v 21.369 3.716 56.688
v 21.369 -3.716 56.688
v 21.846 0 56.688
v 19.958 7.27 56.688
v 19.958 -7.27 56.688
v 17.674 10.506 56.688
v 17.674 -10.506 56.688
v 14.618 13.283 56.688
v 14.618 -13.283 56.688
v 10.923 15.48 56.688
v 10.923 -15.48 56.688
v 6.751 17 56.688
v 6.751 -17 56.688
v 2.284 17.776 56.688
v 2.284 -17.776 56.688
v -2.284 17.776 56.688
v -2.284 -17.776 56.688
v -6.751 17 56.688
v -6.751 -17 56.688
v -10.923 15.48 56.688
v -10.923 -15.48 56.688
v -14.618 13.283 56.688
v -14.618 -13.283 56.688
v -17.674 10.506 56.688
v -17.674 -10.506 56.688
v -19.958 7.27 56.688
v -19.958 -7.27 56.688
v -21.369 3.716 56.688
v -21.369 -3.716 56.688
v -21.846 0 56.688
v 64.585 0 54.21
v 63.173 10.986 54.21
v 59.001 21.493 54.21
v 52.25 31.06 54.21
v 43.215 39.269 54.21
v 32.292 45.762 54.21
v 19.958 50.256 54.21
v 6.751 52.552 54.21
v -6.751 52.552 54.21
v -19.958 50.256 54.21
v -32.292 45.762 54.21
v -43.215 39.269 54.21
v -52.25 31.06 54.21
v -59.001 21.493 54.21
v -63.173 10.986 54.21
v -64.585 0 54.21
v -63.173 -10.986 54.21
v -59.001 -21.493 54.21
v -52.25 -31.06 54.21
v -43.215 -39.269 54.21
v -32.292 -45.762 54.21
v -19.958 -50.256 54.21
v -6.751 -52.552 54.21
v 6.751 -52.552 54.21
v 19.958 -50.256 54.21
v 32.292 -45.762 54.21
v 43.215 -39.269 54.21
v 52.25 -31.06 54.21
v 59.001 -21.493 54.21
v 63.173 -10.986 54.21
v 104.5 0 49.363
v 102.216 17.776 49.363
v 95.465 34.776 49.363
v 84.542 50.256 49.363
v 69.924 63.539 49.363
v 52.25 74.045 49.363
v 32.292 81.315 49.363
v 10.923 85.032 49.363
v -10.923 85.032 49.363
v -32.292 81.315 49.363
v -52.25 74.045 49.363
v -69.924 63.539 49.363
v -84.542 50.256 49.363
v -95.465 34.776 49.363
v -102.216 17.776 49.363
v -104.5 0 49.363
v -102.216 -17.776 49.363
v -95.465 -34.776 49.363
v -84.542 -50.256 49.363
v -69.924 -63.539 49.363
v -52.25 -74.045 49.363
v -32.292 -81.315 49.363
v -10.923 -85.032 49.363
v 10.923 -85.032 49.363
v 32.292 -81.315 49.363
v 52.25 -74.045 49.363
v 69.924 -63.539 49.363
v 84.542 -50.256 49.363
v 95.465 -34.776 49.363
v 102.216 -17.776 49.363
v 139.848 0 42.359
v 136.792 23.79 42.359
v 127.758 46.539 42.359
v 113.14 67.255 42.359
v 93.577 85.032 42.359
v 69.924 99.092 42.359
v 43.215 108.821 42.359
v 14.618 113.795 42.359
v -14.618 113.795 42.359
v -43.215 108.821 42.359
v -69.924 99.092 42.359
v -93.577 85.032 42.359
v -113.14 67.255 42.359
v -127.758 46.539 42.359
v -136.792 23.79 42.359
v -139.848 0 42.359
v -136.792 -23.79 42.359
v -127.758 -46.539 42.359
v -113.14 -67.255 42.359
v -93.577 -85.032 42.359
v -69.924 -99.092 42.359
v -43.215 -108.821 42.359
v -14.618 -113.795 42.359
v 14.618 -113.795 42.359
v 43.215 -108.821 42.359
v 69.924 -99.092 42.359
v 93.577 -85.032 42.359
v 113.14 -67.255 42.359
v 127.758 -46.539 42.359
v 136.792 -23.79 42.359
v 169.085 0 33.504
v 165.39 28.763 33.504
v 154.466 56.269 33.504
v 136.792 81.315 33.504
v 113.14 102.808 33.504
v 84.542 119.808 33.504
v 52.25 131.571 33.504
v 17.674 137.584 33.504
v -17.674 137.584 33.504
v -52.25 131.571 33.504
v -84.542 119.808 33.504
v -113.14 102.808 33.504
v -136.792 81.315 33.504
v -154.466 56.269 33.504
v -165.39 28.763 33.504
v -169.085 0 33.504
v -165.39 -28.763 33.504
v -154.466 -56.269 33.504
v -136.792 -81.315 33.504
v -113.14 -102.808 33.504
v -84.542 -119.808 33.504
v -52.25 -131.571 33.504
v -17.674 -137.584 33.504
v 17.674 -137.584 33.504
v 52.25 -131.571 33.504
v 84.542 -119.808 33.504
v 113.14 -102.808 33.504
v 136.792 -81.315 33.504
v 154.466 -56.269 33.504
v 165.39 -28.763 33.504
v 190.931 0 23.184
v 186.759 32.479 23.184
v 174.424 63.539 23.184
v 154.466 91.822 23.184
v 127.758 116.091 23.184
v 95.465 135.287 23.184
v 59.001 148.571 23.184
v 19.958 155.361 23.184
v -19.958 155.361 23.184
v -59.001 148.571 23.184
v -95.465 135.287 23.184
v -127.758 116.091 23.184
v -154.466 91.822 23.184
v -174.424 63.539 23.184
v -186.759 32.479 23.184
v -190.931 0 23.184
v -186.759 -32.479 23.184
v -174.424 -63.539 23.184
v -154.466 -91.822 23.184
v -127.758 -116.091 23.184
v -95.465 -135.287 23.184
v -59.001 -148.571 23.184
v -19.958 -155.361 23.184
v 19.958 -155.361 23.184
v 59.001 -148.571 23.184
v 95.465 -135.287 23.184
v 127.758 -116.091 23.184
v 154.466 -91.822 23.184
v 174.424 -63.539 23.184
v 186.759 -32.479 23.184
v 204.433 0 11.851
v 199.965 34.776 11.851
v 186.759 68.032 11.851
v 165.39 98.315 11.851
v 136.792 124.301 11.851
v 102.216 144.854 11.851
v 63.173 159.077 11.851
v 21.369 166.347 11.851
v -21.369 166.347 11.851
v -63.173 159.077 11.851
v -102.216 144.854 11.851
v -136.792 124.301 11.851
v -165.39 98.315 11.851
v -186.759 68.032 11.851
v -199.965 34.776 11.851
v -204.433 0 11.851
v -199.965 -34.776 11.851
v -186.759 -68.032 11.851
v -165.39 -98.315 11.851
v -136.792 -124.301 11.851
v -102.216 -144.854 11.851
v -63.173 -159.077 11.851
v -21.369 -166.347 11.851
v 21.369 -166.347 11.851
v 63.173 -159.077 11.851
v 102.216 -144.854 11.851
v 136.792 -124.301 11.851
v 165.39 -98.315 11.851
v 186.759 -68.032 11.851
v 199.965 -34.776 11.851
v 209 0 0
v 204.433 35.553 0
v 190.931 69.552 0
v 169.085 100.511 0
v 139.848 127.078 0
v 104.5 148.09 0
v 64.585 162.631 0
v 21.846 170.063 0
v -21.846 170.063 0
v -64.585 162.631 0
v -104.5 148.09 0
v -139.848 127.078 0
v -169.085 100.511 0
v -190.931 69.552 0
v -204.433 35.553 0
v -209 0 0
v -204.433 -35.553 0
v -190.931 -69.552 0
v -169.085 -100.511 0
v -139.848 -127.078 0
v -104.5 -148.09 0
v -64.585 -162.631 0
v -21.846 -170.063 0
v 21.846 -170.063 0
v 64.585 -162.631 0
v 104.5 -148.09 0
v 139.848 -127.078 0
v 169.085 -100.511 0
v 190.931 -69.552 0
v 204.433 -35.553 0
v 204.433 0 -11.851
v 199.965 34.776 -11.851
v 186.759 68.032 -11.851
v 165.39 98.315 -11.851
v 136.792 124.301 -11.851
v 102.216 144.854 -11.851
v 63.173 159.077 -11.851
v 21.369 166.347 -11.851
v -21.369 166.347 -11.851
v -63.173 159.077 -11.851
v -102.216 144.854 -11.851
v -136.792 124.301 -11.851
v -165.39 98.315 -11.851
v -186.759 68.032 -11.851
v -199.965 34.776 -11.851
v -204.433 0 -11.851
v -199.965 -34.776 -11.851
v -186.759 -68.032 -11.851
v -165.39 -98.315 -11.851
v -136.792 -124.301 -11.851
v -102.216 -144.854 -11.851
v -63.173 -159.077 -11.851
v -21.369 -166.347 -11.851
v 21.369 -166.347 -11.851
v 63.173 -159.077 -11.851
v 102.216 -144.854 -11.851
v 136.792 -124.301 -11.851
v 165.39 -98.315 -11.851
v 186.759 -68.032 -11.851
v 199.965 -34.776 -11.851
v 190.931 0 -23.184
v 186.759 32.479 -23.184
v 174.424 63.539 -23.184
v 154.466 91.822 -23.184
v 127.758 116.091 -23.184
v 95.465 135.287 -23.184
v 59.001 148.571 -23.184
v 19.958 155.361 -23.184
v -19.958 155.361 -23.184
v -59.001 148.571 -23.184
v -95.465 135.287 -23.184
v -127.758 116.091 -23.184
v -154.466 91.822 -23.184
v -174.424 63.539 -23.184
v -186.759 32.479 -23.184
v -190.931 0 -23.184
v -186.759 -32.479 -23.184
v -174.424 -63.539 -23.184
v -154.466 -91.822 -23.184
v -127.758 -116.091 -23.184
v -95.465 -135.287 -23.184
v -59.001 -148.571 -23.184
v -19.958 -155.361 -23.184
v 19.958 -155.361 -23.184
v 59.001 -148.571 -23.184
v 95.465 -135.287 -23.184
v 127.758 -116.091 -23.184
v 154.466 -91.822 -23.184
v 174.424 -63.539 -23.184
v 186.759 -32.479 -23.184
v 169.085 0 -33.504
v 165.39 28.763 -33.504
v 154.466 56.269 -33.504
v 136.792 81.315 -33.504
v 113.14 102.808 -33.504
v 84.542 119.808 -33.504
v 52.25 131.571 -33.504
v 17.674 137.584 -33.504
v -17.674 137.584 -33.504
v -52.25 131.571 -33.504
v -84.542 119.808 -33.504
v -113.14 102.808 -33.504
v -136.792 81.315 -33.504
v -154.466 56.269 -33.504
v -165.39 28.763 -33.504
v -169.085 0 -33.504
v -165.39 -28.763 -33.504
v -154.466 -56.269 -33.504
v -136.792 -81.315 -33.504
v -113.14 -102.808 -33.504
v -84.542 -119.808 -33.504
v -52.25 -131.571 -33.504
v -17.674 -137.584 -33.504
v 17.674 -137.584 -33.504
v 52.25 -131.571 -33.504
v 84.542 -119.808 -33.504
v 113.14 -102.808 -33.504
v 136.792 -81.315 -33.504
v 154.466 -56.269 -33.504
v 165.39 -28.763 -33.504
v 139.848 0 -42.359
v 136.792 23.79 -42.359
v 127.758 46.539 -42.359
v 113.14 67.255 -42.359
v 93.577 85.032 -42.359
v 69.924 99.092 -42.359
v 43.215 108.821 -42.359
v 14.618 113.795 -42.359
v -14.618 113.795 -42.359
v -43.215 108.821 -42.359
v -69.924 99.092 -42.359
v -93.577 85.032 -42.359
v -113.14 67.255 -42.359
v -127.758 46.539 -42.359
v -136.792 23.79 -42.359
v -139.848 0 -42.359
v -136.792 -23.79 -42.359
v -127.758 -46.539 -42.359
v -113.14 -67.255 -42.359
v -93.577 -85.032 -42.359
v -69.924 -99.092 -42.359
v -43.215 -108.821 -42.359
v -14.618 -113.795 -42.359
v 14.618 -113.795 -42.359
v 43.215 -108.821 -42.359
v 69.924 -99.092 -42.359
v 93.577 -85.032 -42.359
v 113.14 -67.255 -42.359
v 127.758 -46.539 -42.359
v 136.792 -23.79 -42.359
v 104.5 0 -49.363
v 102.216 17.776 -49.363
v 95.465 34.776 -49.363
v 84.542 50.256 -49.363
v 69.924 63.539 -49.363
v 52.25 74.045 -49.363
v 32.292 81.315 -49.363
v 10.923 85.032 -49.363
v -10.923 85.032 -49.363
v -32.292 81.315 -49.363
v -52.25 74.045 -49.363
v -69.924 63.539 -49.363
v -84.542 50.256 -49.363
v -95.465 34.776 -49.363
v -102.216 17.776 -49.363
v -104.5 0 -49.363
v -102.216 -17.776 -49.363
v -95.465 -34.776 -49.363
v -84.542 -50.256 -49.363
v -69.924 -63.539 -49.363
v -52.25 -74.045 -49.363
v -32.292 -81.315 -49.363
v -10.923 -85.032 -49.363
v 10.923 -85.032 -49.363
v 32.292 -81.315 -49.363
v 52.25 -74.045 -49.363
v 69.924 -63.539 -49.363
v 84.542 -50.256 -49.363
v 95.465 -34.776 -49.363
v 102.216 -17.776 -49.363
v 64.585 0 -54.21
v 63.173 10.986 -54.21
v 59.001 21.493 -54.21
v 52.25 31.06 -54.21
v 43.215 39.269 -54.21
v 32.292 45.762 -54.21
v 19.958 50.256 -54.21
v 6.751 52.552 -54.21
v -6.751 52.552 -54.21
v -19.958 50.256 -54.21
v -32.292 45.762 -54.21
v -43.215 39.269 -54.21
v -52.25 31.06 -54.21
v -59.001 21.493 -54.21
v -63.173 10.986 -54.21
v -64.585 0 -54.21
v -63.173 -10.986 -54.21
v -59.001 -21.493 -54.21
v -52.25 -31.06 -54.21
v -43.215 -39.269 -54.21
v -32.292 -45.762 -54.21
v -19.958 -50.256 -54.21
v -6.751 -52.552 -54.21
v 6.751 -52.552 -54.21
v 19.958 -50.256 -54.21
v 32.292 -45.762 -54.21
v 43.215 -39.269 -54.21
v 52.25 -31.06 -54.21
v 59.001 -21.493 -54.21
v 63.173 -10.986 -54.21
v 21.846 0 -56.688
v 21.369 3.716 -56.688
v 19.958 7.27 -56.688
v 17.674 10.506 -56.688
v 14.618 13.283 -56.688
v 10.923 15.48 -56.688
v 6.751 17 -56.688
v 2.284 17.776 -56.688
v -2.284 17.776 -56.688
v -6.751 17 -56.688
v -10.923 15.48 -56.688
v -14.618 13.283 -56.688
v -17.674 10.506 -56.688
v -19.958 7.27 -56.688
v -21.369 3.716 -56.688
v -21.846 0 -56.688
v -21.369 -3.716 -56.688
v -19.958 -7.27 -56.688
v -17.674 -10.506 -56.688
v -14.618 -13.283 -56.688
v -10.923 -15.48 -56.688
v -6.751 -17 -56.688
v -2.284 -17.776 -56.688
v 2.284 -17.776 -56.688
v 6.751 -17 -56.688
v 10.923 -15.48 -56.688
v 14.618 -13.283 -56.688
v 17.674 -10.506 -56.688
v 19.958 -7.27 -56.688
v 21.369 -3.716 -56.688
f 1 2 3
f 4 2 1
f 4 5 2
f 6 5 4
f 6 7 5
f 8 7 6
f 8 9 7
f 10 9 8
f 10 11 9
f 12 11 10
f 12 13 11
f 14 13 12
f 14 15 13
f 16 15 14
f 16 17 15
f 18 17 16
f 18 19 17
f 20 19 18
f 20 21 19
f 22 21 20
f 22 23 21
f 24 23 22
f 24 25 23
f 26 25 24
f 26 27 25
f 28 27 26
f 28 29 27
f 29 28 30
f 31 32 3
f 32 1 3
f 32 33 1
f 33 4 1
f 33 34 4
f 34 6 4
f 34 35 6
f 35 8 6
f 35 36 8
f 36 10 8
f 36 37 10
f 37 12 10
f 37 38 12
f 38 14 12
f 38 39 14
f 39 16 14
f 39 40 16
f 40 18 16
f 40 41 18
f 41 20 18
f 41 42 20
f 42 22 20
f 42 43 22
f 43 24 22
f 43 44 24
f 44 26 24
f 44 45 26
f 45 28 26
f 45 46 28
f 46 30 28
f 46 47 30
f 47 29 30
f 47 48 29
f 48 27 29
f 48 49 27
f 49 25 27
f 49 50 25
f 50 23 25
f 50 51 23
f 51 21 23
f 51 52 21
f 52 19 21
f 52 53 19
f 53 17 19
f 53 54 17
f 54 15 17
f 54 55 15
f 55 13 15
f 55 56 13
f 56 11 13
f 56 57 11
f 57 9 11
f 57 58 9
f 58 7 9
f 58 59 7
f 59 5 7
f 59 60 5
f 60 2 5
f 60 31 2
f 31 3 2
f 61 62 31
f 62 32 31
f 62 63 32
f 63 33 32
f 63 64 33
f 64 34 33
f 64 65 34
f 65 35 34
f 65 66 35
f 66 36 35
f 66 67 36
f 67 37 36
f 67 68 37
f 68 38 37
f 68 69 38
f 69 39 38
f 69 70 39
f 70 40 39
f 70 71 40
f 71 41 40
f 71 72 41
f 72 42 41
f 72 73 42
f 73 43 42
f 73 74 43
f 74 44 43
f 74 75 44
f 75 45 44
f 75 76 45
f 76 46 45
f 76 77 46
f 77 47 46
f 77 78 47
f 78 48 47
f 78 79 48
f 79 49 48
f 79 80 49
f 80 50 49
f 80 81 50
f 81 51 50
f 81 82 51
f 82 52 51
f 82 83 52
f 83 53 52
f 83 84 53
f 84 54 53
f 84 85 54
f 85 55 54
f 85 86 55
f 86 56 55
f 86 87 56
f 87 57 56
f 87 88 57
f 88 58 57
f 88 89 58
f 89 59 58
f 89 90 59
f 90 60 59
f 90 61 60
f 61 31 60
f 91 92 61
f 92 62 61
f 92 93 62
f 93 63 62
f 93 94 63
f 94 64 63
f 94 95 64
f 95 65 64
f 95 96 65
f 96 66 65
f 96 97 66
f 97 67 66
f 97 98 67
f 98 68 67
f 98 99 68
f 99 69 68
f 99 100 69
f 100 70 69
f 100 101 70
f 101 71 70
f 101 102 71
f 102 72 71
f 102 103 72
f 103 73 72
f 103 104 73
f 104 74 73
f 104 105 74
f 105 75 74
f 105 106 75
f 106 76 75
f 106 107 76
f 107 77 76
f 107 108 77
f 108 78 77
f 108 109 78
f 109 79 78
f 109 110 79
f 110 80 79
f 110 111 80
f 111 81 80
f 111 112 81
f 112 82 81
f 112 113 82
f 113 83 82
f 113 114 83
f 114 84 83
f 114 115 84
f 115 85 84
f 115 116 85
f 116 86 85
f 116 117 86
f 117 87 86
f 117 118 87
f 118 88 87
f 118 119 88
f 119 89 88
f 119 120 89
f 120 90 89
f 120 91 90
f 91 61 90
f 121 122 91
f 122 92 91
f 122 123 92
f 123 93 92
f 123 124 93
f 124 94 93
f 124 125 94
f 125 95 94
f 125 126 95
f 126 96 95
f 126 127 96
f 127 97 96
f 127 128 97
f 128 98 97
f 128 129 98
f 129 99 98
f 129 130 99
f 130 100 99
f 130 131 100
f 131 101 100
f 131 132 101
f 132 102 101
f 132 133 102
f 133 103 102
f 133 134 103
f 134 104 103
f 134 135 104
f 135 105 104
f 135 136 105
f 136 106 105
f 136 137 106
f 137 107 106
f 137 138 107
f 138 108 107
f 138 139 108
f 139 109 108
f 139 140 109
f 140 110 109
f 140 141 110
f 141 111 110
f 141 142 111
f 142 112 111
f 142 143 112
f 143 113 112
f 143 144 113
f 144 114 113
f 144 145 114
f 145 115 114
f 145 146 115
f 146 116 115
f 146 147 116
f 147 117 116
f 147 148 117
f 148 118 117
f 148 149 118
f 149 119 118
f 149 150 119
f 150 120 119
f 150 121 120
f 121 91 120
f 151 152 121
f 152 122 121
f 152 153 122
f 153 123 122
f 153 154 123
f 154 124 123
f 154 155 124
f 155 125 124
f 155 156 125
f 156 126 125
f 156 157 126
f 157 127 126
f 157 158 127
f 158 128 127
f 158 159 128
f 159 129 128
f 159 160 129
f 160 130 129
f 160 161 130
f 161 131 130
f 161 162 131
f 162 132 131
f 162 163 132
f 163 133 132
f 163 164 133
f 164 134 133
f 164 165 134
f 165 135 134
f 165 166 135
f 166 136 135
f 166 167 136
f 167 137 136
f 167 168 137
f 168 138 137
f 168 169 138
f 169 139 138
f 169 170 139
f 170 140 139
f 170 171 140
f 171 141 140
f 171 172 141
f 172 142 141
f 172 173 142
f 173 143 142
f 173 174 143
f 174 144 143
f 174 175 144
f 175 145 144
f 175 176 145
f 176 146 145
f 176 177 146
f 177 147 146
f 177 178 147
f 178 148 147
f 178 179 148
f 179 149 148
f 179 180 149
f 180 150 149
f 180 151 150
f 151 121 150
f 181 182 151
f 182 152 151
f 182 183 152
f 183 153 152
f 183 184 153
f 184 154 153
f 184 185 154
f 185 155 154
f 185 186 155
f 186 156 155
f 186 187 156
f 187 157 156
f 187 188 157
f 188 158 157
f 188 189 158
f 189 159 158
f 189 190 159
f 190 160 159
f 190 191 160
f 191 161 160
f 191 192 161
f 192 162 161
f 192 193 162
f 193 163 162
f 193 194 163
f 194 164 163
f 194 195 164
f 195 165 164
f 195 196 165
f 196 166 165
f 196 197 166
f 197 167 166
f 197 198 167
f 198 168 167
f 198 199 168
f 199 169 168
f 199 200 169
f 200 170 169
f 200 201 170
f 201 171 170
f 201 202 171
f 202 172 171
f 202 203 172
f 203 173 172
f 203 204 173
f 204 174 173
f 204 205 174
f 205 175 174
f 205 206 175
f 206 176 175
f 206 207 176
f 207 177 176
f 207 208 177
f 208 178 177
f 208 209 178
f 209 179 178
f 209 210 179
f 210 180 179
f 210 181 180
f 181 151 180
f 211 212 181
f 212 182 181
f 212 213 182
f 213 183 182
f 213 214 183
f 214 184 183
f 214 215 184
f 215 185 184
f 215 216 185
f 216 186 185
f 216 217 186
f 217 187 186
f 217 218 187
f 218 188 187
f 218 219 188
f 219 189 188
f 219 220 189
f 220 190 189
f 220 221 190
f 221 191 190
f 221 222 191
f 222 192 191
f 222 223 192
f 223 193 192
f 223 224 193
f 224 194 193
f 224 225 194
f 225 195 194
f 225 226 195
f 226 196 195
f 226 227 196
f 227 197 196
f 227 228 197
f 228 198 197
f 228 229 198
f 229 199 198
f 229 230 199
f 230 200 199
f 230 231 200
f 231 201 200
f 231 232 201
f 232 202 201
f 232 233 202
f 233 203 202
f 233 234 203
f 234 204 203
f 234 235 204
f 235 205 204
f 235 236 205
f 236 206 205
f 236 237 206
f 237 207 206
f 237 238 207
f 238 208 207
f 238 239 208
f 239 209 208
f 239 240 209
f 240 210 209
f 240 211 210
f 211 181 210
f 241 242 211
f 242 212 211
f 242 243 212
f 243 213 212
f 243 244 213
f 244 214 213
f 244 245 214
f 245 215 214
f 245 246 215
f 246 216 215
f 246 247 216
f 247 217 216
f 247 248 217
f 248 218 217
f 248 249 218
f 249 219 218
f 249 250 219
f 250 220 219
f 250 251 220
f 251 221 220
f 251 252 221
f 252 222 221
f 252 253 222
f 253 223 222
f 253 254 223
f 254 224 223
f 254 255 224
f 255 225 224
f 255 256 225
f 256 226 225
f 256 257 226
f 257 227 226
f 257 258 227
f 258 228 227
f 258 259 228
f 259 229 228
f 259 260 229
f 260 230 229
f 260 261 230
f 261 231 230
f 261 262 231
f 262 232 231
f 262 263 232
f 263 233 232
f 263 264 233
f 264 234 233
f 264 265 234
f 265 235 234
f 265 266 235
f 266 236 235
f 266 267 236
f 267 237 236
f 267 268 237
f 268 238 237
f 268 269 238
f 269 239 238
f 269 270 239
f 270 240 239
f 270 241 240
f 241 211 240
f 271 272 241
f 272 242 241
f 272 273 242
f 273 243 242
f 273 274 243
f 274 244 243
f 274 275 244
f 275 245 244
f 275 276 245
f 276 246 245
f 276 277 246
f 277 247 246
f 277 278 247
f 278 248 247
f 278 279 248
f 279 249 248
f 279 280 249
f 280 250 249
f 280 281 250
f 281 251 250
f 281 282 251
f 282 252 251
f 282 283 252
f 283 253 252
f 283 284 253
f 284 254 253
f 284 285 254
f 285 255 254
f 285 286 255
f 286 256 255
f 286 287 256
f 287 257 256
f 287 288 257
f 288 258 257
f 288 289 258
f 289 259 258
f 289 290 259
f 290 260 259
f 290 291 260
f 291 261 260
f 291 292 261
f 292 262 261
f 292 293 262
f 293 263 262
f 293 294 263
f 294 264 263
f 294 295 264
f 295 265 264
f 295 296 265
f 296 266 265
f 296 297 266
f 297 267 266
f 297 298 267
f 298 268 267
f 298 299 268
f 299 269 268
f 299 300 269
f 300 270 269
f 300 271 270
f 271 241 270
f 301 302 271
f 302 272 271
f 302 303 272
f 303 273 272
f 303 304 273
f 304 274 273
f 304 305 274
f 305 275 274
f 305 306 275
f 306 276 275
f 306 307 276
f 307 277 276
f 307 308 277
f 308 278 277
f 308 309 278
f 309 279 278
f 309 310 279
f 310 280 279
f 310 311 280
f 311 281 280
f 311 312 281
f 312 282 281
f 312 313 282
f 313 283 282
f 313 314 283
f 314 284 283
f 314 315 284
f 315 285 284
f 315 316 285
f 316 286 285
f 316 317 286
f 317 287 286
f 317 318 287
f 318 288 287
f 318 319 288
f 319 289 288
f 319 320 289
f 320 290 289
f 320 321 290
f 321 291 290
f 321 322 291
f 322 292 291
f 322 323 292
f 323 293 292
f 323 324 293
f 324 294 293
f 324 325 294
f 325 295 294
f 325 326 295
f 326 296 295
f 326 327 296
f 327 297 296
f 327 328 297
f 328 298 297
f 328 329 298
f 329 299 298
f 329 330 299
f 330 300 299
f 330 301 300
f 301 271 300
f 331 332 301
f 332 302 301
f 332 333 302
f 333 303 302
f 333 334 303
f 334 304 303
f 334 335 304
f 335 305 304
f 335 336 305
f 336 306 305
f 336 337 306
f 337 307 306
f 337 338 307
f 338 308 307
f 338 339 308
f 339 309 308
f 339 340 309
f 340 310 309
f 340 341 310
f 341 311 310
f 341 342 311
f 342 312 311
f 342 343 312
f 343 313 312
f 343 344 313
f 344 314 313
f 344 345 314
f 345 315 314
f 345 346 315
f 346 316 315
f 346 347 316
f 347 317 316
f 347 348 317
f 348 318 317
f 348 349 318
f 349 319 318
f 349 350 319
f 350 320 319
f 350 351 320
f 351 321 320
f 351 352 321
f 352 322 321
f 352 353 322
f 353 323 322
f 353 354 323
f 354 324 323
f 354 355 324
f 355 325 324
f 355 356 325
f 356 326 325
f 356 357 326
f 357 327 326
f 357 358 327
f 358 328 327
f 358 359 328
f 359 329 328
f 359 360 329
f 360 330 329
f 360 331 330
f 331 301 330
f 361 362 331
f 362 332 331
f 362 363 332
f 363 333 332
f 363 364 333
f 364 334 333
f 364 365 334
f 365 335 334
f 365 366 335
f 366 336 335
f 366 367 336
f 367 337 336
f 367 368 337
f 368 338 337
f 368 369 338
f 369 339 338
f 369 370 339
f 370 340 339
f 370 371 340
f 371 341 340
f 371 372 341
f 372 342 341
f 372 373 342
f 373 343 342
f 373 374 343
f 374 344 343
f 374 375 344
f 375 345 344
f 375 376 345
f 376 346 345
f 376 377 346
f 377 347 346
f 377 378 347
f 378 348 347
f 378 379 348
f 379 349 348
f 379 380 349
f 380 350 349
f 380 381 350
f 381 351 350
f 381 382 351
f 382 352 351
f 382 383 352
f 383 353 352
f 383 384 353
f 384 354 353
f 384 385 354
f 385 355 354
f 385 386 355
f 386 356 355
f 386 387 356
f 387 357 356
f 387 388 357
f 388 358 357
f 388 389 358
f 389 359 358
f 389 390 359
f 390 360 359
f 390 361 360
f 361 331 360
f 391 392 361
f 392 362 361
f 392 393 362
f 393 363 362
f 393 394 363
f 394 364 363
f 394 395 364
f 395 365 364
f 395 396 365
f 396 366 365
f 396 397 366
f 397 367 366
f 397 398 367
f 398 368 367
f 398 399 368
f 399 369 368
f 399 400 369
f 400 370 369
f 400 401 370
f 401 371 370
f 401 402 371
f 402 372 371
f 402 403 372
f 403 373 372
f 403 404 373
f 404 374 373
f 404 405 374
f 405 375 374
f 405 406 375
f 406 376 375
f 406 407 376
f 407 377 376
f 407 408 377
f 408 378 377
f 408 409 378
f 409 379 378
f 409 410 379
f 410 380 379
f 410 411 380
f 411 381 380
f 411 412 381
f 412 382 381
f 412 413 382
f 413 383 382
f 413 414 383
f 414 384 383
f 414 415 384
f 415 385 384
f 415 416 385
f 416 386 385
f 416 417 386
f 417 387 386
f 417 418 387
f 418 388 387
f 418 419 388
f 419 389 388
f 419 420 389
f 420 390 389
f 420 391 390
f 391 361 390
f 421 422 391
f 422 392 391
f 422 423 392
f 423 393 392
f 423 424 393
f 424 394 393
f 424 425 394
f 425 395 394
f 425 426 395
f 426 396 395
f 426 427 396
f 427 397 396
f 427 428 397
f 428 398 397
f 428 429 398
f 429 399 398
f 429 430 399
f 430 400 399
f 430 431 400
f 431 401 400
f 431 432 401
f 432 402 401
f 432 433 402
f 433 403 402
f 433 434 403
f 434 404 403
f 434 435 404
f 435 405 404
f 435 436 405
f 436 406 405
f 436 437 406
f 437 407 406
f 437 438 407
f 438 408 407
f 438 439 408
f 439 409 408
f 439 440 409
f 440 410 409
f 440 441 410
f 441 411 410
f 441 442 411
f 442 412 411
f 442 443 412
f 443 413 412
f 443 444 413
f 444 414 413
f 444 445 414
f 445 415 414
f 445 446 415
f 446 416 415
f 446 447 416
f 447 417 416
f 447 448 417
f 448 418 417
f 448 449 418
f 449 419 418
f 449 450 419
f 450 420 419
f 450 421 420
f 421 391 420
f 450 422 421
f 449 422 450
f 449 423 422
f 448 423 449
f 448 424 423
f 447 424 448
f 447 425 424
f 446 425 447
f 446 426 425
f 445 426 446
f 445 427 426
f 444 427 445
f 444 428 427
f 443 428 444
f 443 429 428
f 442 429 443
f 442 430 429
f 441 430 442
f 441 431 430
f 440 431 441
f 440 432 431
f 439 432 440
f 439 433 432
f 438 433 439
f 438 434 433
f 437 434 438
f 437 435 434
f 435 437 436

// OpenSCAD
// Generated by SolidPython 1.0.1 on 2020-07-29 00:46:49


scale(v = [11, 9, 3]) {
	sphere(r = 19);
}
/***********************************************
*********      SolidPython code:      **********
************************************************
 
# import packages: SolidPython
from solid import *
from solid.utils import *
from itertools import chain, combinations, permutations


class Resize:

    def __init__(self, scad_file):
        self.scad_file = scad_file
        #self.scad_file = import_scad(scad_file)
        # cone/cylinder param:
        self.r1 = 0
        self.r2 = 0
        self.h = 0
        # rectangular prism param:
        self.w = 0
        self.l = 0
        # ellipse param:
        self.r = 0

    # import OpenScad code (file name corresponds to shape)


    # classify shape + parameters
    def assign(self, param1, param2, param3):
        if self.scad_file == 'cone.scad':
            self.r1 = param1
            self.r2 = param2
            self.h = param3
        elif self.scad_file == 'cylinder.scad':
            self.r1 = param1
            self.r2 = param2
            self.h = param3
        elif self.scad_file == 'rectangularPrism.scad':
            self.h = param1
            self.l = param2
            self.w = param3
        else:
            self.r = param1
            self.h = param2

    # resize parameters
    def iterate(self):
        x = range(3, 20, 2)
        i = 1
        if self.scad_file == 'cone.scad':
            tempList = list(permutations(x, 2))
            for temp in tempList:
                param1 = temp[0]
                param2 = temp[1]
                filepath = 'produced_scad_files/' + 'cone' + str(param1) + '_' + str(param2) + '_' + '.scad'
                scad_render_to_file(cylinder(h=param1, r1=param2, r2=0), filepath)

        elif self.scad_file == 'cylinder.scad':
            tempList = list(permutations(x, 3))
            for temp in tempList:
                param1 = temp[0]
                param2 = temp[1]
                filepath = 'produced_scad_files/' + 'cylinder' + str(param1) + '_' + str(param2) + '_' + '.scad'
                scad_render_to_file(cylinder(h=param1, r1=param2, r2=param2), filepath)

        elif self.scad_file == 'rectangularPrism.scad':
            tempList = list(permutations(x, 3))
            for temp in tempList:
                param1 = temp[0]
                param2 = temp[1]
                param3 = temp[2]
                filepath = 'produced_scad_files/' + 'rectangularPrism' + str(param1) + '_' + str(param2) + '_' + str(
                    param3) + '.scad'
                scad_render_to_file(cube(size=(param1, param2, param3)), filepath)

        elif self.scad_file == 'ellipse.scad':
            tempList = list(permutations(x, 4))
            for temp in tempList:
                param1 = temp[0]
                param2 = temp[1]
                param3 = temp[2]
                param4 = temp[3]
                filepath = 'produced_scad_files/' + 'ellipse' + str(param1) + '_' + str(param2) + '_' + str(param3) + '_' + str(param4) + '.scad'
                scad_render_to_file(scale([param1, param2, param3])(sphere(r=param4)), filepath)

    def render_to_scadfile(self):
        scad_render_to_file(scad, 'example.scad') 
 
************************************************/
